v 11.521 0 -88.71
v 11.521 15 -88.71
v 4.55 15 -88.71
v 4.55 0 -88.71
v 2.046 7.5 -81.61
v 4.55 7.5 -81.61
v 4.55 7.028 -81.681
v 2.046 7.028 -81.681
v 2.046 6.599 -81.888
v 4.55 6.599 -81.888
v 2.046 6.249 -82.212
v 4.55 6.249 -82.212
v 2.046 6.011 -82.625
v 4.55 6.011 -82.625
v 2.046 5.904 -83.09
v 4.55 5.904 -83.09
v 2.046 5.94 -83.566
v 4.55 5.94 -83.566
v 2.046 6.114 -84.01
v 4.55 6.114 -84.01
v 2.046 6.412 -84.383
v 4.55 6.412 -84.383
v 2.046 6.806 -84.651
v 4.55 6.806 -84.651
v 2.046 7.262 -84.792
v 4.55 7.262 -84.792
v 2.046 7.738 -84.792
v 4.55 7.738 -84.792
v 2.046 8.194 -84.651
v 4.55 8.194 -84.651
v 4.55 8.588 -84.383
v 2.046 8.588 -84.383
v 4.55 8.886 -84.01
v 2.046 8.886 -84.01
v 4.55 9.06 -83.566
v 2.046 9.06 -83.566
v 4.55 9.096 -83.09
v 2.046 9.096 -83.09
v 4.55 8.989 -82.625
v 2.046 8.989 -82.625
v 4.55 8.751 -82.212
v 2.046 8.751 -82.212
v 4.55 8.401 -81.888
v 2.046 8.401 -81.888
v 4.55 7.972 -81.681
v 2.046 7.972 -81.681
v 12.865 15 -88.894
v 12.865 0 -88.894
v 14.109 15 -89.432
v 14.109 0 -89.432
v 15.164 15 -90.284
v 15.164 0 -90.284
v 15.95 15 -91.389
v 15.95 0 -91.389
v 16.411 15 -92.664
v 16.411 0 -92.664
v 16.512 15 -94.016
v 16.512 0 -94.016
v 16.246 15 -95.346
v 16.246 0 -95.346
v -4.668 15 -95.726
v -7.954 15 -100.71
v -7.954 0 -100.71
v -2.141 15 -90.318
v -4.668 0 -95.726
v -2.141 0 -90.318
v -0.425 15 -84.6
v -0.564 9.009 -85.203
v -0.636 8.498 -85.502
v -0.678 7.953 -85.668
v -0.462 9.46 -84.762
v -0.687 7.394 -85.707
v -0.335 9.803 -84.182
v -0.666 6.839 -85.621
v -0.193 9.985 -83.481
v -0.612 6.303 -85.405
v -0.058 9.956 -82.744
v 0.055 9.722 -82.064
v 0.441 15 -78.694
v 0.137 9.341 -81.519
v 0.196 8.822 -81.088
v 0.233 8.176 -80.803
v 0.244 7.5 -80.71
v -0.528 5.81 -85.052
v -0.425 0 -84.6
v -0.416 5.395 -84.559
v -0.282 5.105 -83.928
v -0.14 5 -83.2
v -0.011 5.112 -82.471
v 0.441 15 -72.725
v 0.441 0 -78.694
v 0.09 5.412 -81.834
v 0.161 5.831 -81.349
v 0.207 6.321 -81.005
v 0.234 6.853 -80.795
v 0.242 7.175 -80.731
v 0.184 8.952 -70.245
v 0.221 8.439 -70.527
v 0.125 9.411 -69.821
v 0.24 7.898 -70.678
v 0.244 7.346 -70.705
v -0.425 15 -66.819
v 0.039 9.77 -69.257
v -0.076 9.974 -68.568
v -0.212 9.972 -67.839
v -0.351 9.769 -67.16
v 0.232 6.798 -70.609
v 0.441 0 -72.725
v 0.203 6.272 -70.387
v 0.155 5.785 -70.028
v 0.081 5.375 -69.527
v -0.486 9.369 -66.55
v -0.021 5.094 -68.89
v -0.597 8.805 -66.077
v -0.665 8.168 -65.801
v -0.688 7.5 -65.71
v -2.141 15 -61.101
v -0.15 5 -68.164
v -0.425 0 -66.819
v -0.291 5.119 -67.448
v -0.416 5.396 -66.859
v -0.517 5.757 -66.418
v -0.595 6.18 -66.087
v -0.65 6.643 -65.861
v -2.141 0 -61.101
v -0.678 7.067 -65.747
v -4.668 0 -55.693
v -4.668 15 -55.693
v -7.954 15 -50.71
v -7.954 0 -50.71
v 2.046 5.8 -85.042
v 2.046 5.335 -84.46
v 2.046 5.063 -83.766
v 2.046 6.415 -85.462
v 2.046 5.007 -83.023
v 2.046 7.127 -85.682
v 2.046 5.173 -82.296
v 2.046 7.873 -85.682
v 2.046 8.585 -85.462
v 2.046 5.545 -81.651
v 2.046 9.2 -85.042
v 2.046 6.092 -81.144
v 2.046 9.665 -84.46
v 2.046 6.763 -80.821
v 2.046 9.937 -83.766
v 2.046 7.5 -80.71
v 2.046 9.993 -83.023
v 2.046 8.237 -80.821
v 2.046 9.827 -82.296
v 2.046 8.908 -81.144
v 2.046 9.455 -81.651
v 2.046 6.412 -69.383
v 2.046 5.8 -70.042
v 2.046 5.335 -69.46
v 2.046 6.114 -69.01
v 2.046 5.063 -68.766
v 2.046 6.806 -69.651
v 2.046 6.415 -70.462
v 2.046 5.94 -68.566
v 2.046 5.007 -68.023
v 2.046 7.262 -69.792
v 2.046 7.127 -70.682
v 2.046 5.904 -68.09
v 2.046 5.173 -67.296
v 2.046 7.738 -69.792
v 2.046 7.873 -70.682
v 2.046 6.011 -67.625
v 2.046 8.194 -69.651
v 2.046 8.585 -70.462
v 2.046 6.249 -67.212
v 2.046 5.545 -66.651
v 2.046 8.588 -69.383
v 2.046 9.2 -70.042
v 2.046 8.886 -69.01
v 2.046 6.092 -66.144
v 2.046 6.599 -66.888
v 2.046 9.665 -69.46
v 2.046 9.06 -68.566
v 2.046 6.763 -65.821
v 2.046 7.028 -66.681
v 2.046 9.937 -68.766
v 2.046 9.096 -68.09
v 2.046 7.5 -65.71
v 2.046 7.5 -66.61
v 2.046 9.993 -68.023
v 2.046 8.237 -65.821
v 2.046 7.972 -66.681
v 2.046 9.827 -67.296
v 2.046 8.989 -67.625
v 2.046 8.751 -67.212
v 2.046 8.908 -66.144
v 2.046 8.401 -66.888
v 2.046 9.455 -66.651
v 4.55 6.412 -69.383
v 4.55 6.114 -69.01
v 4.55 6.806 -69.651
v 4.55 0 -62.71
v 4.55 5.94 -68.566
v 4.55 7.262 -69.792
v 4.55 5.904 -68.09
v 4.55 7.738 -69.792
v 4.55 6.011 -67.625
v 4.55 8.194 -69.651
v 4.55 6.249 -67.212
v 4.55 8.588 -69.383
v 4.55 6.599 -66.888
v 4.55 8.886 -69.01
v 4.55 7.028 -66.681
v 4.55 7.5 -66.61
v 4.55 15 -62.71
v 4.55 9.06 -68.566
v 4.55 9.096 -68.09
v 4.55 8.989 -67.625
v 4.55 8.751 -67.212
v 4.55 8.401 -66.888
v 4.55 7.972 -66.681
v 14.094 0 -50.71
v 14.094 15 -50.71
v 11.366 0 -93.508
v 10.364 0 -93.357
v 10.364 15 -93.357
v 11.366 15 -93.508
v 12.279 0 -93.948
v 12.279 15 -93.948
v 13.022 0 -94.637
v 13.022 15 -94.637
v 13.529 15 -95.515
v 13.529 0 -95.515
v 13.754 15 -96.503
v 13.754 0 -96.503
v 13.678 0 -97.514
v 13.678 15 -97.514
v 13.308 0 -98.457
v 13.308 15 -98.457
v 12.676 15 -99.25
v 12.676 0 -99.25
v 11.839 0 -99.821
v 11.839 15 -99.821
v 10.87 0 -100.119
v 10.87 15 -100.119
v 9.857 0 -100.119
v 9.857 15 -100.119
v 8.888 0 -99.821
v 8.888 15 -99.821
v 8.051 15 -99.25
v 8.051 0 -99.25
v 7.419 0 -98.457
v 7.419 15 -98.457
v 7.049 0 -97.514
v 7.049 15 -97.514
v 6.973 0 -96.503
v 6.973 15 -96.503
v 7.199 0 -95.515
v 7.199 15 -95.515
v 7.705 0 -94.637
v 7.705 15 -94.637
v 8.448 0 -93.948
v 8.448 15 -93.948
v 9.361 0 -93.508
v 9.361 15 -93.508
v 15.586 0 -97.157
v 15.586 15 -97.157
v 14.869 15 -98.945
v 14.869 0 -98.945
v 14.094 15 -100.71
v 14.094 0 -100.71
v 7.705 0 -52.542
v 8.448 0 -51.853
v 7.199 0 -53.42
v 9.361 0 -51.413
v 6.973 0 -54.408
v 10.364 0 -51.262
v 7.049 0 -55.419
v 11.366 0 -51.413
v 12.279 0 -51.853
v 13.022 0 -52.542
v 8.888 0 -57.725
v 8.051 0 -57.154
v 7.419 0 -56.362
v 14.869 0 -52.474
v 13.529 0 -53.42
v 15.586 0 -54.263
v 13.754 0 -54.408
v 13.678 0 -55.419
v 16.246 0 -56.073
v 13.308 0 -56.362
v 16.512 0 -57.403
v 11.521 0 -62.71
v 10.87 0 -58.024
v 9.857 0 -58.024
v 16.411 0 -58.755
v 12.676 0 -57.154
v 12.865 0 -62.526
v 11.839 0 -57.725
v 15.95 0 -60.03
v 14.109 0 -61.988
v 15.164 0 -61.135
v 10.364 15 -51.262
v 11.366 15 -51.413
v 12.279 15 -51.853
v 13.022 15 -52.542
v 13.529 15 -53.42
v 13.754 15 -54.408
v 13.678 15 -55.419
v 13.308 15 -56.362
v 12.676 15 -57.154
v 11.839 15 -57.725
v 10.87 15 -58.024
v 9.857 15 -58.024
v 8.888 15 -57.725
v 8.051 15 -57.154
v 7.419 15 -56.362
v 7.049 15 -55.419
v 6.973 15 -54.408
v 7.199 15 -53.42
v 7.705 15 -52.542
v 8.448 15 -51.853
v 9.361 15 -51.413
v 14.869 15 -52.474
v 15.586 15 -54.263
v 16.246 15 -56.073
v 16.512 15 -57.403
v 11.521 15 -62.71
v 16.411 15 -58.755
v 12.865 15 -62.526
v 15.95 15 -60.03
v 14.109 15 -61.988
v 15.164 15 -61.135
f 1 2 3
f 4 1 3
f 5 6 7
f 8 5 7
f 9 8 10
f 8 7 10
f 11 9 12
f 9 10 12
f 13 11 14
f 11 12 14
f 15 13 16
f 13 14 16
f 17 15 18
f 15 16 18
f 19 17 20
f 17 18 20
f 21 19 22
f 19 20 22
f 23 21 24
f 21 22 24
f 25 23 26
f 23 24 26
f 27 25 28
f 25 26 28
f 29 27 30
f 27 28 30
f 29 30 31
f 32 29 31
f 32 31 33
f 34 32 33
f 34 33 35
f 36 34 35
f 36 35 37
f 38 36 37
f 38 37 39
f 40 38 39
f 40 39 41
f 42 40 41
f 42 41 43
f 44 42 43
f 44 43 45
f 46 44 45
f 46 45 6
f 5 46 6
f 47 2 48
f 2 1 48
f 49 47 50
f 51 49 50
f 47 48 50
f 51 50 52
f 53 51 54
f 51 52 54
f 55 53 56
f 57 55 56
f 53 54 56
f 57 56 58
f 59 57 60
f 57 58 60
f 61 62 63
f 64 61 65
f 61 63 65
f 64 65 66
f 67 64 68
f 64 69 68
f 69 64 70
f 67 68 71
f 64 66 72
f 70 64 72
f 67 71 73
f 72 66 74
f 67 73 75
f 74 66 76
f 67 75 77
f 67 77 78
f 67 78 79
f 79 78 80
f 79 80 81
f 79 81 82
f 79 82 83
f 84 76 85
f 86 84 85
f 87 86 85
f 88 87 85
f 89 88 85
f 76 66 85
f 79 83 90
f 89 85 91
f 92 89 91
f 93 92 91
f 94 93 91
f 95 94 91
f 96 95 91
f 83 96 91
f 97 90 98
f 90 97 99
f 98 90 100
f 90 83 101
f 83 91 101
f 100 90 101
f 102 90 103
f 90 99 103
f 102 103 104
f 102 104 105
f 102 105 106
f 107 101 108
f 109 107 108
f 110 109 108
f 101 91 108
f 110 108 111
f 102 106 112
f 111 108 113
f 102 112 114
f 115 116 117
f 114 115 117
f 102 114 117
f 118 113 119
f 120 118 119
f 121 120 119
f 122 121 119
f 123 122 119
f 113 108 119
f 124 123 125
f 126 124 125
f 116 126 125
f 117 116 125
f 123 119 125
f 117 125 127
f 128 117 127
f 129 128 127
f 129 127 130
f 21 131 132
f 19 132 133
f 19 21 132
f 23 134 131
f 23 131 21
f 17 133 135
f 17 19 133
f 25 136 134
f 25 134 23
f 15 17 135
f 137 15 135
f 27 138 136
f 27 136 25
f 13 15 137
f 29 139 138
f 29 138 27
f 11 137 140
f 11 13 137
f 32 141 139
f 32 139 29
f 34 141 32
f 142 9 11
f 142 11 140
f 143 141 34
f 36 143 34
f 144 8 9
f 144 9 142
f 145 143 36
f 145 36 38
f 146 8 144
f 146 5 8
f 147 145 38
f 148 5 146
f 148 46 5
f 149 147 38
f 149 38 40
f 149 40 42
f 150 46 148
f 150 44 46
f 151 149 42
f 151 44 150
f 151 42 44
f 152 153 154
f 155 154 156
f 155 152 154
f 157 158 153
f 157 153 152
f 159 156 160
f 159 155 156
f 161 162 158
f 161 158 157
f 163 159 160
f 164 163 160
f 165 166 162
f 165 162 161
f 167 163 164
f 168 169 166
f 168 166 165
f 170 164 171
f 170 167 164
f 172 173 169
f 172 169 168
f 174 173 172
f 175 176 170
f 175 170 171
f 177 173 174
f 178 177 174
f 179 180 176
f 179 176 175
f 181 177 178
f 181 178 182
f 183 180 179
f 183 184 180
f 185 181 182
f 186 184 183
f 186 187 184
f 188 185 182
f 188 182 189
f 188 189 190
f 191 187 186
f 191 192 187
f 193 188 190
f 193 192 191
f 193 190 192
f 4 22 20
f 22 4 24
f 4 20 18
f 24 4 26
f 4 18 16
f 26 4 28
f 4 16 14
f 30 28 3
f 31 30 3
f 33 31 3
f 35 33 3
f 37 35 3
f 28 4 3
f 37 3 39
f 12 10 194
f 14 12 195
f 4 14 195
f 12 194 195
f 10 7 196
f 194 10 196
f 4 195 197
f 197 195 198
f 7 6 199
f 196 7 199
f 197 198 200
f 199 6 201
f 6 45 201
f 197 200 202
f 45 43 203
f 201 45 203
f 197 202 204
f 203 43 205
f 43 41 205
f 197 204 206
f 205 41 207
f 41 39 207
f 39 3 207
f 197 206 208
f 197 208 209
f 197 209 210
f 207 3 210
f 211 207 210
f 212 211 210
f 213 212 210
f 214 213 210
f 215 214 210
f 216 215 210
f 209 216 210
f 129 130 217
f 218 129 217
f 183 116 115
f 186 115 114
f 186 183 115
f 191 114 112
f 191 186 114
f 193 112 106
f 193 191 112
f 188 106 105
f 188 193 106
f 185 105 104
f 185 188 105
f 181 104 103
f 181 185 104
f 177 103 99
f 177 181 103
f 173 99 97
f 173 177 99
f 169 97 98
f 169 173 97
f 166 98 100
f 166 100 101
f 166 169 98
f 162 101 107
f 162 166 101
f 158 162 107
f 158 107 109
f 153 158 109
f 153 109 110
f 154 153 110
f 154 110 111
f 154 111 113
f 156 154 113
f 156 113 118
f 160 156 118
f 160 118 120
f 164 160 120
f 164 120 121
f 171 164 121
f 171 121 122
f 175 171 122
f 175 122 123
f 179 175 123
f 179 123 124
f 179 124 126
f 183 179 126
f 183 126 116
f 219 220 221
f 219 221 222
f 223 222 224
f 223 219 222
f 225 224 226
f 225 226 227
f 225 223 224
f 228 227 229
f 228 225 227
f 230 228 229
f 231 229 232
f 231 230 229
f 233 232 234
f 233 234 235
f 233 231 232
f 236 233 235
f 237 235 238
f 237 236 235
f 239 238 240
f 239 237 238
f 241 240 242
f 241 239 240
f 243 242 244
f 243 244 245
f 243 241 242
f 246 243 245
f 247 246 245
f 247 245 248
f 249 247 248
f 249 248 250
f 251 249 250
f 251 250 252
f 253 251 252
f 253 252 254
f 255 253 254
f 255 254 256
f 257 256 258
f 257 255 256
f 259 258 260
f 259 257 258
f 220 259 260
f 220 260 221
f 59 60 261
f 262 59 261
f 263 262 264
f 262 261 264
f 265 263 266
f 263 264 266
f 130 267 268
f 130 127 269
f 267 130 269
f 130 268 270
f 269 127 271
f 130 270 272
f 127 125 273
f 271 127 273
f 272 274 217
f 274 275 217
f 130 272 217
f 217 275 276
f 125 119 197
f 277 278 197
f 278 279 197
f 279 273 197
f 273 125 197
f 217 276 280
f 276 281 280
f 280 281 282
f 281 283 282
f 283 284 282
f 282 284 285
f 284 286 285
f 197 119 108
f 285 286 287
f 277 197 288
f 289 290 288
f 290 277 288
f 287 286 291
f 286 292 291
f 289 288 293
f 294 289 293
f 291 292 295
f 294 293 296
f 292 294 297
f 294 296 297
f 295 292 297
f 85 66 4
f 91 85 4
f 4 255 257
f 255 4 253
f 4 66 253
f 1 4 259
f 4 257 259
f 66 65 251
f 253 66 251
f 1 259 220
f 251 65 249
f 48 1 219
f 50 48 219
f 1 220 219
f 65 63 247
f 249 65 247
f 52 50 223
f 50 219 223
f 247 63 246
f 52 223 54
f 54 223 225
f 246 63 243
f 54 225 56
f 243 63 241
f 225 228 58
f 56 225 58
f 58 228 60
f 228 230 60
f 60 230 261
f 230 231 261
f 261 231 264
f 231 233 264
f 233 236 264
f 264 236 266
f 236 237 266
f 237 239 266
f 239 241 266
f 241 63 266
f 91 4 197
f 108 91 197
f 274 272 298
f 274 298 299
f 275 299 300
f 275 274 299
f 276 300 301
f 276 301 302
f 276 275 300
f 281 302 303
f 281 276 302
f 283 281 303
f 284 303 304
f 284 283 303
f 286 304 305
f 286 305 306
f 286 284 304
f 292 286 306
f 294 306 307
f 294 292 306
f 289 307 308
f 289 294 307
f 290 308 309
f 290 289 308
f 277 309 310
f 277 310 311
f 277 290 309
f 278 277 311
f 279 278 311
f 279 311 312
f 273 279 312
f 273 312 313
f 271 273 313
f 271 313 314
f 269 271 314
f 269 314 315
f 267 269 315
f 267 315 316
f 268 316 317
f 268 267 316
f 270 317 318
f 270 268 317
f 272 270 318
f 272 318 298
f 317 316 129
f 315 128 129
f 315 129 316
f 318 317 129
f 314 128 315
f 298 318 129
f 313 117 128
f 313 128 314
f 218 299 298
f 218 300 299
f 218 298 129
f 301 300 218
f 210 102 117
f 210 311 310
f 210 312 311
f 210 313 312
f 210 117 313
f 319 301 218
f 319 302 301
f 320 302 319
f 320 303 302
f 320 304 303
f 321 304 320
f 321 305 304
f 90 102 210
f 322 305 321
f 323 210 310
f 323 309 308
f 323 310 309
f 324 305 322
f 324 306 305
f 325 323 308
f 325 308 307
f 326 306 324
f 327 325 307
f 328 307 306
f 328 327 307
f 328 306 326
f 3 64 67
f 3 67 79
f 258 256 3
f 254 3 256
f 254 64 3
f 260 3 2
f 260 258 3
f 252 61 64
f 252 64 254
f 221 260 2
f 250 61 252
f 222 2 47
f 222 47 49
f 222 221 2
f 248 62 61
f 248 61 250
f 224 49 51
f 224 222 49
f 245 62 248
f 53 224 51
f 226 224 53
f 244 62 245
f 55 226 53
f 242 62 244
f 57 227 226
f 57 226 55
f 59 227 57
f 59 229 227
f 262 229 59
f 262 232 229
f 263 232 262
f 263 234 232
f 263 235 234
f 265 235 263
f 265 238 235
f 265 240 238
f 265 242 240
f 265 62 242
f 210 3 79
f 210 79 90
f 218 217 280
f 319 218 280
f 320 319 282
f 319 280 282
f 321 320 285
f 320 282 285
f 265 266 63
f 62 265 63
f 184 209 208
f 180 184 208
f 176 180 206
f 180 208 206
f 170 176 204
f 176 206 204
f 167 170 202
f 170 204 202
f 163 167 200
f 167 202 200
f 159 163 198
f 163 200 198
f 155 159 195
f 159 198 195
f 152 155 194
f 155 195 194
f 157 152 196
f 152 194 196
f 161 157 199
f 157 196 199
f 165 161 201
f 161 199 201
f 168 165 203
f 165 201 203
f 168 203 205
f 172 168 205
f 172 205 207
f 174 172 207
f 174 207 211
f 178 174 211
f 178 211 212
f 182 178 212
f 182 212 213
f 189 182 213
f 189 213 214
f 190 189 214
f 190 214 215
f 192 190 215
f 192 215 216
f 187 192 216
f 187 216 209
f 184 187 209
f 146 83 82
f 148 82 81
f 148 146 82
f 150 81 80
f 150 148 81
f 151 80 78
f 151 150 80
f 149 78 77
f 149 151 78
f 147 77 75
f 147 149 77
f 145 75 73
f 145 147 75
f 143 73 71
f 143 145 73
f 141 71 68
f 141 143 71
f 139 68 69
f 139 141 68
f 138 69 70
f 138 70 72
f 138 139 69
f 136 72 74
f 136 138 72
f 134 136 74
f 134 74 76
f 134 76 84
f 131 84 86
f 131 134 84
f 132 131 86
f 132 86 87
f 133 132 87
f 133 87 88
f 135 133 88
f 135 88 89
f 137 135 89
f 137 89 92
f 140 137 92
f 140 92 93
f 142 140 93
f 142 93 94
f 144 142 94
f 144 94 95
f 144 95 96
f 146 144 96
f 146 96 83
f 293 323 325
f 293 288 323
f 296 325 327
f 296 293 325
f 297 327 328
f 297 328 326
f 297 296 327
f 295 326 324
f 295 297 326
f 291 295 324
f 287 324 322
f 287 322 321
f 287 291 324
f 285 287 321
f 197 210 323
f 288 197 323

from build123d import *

# Parameters (mm, degrees)
SKETCH_1_R          = 3.4
EXTRUDE_2_DEPTH     = 15
CUT_EXTRUDE_1_DEPTH = 104.680547991
CUT_EXTRUDE_2_DEPTH = 103.721548766
CUT_EXTRUDE_START   = -10
SKETCH_6_R          = 2.5
SKETCH_6_R_2        = 1.6
CUT_EXTRUDE_3_DEPTH = 10
FILLET_1_R          = 5


with BuildPart() as part:
    # 草图1 → 凸台-拉伸2 (new body)
    with BuildSketch(Plane(origin=(0, 0, 0), x_dir=(1, 0, 0), z_dir=(0, 1, 0))):
        with BuildLine():
            ThreePointArc((-7.95357839, 100.709696918), (0.550267992, 75.709696918), (-7.95357839, 50.709696918))
            Line((-7.95357839, 50.709696918), (14.093828565, 50.709696918))
            ThreePointArc((14.093828565, 50.709696918), (19.550267992, 75.709696918), (14.093828565, 100.709696918))
            Line((14.093828565, 100.709696918), (-7.95357839, 100.709696918))
        make_face()
        with Locations(Location((10.36364228, 96.757285698, 0), (0, 0, 270))):
            Circle(SKETCH_1_R, mode=Mode.SUBTRACT)
        with Locations(Location((10.36364228, 54.662108138, 0), (0, 0, 270))):
            Circle(SKETCH_1_R, mode=Mode.SUBTRACT)
    extrude(amount=EXTRUDE_2_DEPTH)

    # 草图2 → 切除-拉伸1 (cut, through all)
    with BuildSketch(Plane(origin=(0, 15, 0), x_dir=(1, 0, 0), z_dir=(0, 1, 0))):
        with BuildLine():
            Line((4.550267992, 88.709696918), (4.550267992, 75.709696918))
            Line((4.550267992, 75.709696918), (19.550267992, 75.709696918))
            ThreePointArc((19.550267992, 75.709696918), (19.192888302, 82.248645039), (18.125006574, 88.709696918))
            Line((18.125006574, 88.709696918), (4.550267992, 88.709696918))
        make_face()
        with BuildLine():
            Line((19.550267992, 75.709696918), (4.550267992, 75.709696918))
            Line((4.550267992, 75.709696918), (4.550267992, 62.709696918))
            Line((4.550267992, 62.709696918), (18.125006574, 62.709696918))
            ThreePointArc((18.125006574, 62.709696918), (19.192888302, 69.170748797), (19.550267992, 75.709696918))
        make_face()
    extrude(amount=-CUT_EXTRUDE_1_DEPTH, mode=Mode.SUBTRACT)

    # 草图4 → 切除-拉伸2 (cut, through all)
    with BuildSketch(Plane(origin=(4.550267992, 0, 0), x_dir=(0, 0, -1), z_dir=(1, 0, 0))):
        with BuildLine():
            ThreePointArc((84.809696918, 7.5), (83.209696918, 9.1), (81.609696918, 7.5))
            Line((81.609696918, 7.5), (84.809696918, 7.5))
        make_face()
        with BuildLine():
            Line((84.809696918, 7.5), (81.609696918, 7.5))
            ThreePointArc((81.609696918, 7.5), (83.209696918, 5.9), (84.809696918, 7.5))
        make_face()
        with BuildLine():
            ThreePointArc((69.809696918, 7.5), (68.209696918, 9.1), (66.609696918, 7.5))
            Line((66.609696918, 7.5), (69.809696918, 7.5))
        make_face()
        with BuildLine():
            Line((69.809696918, 7.5), (66.609696918, 7.5))
            ThreePointArc((66.609696918, 7.5), (68.209696918, 5.9), (69.809696918, 7.5))
        make_face()
    extrude(amount=-CUT_EXTRUDE_2_DEPTH, mode=Mode.SUBTRACT)

    # 草图6 → 切除-拉伸3 (cut)
    # profile 1 of 2: a face of its own
    with BuildSketch(Plane.ZY.offset(7.95357839).offset(CUT_EXTRUDE_START)):
        with Locations((-83.209696918, 7.5)):
            Circle(SKETCH_6_R)
        with Locations(Location((-83.209696918, 7.5, 0), (0, 0, 180))):
            Circle(SKETCH_6_R_2, mode=Mode.SUBTRACT)
    # profile 2 of 2: a face of its own
    with BuildSketch(Plane.ZY.offset(7.95357839).offset(CUT_EXTRUDE_START)):
        with Locations((-68.209696918, 7.5)):
            Circle(SKETCH_6_R)
        with Locations(Location((-68.209696918, 7.5, 0), (0, 0, 180))):
            Circle(SKETCH_6_R_2, mode=Mode.SUBTRACT)
    extrude(amount=CUT_EXTRUDE_3_DEPTH, mode=Mode.SUBTRACT)

    # 圆角1
    fillet_1_edges = [part.edges().sort_by_distance(p)[0] for p in [
        (18.125006574, 7.5, -88.709696918),
        (18.125006574, 7.5, -62.709696918),
    ]]
    fillet(fillet_1_edges, radius=FILLET_1_R)


solid = part.part
